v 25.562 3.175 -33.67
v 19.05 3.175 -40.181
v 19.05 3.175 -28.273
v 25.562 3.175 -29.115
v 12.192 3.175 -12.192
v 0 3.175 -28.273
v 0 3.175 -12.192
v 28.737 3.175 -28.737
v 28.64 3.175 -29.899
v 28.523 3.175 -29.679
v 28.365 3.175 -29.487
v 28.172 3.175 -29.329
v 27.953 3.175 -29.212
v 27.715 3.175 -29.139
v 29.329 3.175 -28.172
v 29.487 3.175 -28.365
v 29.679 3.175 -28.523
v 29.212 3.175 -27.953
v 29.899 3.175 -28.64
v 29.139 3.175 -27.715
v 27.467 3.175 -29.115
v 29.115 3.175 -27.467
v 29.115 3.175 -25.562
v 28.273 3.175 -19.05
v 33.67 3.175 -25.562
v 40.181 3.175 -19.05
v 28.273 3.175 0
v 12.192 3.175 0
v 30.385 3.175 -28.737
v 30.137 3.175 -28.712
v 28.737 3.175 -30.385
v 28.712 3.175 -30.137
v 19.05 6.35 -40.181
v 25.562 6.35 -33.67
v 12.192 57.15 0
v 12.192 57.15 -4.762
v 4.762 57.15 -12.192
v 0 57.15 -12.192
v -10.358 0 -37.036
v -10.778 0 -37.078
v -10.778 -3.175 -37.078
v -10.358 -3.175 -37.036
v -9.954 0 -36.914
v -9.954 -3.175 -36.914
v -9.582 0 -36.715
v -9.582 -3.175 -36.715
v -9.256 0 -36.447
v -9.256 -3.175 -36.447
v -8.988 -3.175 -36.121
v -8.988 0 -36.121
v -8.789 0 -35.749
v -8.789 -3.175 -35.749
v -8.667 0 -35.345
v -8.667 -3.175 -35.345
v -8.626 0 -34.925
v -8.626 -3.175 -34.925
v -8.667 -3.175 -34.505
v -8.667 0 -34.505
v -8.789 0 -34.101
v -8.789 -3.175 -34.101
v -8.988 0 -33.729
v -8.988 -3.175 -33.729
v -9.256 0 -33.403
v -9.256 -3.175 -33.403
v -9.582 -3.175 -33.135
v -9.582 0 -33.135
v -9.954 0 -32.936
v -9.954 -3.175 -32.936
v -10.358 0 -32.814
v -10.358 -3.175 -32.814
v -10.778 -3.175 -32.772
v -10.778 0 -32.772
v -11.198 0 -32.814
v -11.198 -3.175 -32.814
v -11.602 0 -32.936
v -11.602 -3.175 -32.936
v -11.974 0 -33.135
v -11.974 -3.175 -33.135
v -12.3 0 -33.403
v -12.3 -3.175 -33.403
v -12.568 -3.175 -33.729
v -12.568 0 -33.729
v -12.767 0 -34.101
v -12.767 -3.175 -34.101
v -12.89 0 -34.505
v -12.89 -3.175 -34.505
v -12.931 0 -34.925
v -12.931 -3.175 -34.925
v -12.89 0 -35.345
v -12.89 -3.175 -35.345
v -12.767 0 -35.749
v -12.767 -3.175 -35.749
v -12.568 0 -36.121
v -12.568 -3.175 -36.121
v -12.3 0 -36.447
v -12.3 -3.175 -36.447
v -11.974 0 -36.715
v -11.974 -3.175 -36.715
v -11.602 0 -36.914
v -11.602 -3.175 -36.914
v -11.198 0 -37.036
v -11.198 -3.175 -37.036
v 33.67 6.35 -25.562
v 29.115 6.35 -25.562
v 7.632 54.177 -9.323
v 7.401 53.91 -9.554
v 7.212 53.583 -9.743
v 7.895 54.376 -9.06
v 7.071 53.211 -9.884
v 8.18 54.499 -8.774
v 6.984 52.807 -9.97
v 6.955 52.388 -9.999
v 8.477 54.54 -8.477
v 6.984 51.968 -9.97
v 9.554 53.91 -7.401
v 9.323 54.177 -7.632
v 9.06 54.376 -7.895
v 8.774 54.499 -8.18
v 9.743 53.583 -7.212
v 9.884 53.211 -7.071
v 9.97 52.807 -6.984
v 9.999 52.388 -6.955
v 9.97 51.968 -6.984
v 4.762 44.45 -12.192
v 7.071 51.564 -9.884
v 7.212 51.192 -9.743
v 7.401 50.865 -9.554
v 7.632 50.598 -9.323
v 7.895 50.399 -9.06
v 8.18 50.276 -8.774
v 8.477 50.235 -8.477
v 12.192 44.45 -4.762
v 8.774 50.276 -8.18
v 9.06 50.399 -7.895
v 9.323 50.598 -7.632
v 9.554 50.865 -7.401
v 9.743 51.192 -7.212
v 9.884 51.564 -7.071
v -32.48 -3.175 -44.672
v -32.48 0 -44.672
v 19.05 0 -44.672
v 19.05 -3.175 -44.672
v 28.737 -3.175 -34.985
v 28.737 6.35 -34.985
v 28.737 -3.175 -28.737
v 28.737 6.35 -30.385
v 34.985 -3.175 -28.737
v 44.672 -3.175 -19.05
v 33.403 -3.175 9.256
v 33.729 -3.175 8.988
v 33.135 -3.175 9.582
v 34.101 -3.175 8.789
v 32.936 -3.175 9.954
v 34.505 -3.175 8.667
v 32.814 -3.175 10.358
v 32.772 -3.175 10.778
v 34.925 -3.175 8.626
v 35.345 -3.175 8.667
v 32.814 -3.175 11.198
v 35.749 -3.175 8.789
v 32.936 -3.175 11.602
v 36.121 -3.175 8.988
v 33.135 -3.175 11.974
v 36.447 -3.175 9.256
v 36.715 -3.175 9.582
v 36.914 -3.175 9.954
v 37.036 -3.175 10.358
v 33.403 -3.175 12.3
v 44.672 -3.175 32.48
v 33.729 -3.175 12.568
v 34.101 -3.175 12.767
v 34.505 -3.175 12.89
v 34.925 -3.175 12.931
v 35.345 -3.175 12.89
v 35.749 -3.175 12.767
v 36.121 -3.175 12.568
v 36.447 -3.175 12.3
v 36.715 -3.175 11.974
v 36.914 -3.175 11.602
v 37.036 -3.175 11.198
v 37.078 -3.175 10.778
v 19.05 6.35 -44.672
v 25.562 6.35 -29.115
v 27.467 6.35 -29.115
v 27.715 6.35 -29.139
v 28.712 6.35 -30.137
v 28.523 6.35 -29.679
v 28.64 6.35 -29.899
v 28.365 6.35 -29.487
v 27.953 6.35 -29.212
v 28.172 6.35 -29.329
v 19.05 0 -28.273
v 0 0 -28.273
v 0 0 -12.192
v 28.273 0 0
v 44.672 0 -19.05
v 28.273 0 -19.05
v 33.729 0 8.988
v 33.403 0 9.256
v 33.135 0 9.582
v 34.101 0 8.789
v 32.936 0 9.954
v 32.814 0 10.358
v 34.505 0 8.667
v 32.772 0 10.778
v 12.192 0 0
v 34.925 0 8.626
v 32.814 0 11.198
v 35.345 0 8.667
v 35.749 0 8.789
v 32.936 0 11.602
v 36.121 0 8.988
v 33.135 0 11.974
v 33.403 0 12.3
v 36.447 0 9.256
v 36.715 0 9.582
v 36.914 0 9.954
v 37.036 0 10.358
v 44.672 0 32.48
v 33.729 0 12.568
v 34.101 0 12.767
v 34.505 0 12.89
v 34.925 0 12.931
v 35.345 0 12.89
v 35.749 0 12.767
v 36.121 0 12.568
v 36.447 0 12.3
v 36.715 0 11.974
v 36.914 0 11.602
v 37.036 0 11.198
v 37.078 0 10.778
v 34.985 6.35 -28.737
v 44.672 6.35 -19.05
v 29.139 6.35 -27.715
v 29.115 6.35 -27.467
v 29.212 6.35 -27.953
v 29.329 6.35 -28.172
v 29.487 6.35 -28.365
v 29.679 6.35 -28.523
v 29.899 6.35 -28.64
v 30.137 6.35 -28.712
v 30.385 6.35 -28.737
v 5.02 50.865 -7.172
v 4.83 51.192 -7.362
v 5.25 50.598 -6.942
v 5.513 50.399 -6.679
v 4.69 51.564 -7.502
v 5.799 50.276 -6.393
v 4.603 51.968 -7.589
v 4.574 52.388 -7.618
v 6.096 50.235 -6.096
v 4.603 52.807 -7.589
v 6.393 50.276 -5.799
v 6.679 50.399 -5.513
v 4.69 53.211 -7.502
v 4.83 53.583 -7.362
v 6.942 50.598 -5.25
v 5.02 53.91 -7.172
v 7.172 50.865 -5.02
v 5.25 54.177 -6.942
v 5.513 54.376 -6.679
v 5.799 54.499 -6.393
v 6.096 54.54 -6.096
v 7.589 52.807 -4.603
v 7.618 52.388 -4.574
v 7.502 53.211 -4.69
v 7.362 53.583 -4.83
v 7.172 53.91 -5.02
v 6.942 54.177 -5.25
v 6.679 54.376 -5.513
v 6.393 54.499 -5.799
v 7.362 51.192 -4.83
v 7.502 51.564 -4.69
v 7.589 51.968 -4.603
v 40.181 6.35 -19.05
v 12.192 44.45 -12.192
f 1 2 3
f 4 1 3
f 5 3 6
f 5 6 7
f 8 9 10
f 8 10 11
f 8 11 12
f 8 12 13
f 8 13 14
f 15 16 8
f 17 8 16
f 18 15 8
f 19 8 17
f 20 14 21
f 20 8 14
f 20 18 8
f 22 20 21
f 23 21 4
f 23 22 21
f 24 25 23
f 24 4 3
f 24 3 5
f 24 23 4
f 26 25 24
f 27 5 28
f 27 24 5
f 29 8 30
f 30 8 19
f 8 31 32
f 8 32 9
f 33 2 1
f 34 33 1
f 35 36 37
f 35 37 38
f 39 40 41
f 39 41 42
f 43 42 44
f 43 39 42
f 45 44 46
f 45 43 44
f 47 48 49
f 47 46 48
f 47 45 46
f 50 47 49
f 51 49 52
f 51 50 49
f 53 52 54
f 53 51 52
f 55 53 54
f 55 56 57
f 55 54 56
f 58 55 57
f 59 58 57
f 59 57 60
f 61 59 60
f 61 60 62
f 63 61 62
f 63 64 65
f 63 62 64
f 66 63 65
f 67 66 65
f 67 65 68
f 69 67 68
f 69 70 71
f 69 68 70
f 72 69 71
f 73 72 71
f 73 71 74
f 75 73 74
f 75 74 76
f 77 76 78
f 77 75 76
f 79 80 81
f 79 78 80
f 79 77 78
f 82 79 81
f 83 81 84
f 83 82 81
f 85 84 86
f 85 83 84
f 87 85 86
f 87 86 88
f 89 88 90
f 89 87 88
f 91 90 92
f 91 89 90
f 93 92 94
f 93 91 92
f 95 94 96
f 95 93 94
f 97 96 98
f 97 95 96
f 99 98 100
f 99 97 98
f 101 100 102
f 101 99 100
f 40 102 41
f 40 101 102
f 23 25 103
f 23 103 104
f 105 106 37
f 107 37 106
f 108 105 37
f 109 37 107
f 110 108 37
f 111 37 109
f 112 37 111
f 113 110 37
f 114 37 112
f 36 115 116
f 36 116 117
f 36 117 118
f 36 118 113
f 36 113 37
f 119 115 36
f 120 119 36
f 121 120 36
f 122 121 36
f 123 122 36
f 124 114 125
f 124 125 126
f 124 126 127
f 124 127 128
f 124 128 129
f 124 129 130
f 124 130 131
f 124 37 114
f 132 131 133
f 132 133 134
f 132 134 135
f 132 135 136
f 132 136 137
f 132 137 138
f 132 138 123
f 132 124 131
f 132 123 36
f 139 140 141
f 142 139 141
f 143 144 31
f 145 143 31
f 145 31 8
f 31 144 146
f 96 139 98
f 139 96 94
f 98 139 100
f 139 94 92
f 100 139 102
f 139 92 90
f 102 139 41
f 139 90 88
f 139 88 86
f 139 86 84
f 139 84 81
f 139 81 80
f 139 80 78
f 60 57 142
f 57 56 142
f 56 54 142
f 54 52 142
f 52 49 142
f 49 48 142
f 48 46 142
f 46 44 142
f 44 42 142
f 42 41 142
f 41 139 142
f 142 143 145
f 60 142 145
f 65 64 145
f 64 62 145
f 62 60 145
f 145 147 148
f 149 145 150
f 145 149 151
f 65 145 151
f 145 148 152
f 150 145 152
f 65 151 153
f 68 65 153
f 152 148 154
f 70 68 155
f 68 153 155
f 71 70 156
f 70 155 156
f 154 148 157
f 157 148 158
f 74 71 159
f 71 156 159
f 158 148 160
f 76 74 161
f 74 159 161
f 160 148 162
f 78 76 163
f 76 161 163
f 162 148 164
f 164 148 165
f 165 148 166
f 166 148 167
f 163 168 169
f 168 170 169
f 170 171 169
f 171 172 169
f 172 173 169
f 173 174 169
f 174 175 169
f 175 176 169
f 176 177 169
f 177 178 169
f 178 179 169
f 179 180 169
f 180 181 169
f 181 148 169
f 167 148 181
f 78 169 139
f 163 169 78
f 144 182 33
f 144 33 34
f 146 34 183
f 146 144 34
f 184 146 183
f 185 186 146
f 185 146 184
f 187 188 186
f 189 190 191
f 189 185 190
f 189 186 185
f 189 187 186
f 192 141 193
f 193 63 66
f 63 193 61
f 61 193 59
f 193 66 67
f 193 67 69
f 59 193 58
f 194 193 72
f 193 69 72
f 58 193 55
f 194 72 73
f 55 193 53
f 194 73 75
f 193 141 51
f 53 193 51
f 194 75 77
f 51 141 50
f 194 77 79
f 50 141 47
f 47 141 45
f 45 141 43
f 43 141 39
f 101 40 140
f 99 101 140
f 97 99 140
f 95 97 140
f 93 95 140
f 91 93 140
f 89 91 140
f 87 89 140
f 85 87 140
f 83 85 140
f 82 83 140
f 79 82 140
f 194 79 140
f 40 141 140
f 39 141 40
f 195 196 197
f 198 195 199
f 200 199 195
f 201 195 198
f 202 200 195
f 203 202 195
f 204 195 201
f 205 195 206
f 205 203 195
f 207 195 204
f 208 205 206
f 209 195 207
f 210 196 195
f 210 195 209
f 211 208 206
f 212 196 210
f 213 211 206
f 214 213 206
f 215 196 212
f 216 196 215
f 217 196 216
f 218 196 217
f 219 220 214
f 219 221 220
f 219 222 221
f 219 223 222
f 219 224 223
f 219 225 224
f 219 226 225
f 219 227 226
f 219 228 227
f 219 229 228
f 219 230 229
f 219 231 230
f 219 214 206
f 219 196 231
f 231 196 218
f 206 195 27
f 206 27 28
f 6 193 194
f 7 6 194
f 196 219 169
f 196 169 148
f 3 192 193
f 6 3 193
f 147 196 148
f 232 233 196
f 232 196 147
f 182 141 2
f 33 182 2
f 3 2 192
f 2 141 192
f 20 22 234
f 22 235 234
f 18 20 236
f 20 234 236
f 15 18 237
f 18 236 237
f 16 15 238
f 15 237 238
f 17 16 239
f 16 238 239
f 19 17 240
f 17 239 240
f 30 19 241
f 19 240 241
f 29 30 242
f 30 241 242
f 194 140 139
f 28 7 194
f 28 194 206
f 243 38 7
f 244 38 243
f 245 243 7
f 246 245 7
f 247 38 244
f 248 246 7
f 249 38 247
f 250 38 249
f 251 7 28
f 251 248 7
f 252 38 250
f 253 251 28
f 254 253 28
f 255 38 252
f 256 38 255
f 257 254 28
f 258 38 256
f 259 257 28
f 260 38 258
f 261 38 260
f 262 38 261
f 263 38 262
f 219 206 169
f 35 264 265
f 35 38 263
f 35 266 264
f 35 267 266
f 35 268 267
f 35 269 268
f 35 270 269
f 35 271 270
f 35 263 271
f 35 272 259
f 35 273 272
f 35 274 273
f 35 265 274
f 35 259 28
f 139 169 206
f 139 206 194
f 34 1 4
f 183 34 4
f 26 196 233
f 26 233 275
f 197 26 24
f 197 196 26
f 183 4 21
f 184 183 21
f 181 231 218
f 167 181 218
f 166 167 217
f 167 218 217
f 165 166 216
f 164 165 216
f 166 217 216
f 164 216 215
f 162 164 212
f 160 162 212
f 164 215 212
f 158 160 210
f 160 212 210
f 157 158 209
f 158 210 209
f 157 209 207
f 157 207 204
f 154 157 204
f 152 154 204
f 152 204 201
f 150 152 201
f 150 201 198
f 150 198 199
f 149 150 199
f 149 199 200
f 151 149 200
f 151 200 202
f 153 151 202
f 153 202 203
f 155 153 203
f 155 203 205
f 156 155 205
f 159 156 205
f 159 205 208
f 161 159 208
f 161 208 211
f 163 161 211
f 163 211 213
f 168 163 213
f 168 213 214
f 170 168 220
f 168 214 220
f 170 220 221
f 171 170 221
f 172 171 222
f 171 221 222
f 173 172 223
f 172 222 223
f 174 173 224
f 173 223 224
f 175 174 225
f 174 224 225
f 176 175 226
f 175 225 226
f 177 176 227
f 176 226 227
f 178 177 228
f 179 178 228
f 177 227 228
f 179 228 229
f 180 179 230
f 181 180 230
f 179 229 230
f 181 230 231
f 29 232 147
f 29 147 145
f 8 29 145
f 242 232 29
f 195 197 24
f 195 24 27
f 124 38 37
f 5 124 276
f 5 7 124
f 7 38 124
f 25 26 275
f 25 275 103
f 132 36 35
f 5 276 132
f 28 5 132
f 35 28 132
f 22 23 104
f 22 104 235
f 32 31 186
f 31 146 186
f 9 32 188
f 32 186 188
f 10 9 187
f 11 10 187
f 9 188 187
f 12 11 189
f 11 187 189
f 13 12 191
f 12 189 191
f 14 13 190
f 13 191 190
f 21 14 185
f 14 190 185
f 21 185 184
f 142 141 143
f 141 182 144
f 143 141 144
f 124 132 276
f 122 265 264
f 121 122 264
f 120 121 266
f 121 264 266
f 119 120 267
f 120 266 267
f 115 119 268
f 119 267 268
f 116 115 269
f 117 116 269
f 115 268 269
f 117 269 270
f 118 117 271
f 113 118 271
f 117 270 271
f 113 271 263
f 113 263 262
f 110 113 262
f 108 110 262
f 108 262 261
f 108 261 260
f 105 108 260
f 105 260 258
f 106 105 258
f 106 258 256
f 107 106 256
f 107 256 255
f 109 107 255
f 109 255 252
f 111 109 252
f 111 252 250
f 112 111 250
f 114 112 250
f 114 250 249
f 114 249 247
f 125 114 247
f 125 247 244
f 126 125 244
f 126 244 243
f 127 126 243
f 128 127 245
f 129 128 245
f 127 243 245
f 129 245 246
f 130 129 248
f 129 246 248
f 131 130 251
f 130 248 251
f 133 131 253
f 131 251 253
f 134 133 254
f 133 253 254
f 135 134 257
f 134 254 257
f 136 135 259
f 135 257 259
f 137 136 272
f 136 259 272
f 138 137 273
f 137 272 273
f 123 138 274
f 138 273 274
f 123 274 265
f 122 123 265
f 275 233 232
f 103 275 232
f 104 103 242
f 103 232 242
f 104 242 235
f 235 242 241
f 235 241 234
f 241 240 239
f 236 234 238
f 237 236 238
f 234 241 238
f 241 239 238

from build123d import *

# Parameters (mm, degrees)
BOSS_EXTRUDE1_DEPTH          = 3.175
BOSS_EXTRUDE2_DEPTH          = 3.175
FILLET1_R                    = 1.27
BOSS_EXTRUDE3_DEPTH          = 41.275
FILLET1_OF_MIRROR2_R         = 1.27
BOSS_EXTRUDE4_DEPTH          = 12.7
F_18_0_1695_DIAMETER_HOLE1_D = 4.3053
CUT_EXTRUDE1_DEPTH           = 9.525
BOSS_EXTRUDE5_DEPTH          = 3.175
F_18_0_1695_DIAMETER_HOLE2_D = 4.3053


with BuildPart() as part:
    # Sketch1 → Boss-Extrude1 (new body)
    with BuildSketch(Plane(origin=(0, 0, 0), x_dir=(1, 0, 0), z_dir=(0, 1, 0))):
        Polygon((34.984785044, 28.736819587), (28.736819587, 28.736819587), (0, 0), (28.272599075, 0), (28.272599075, 19.05), (44.671604631, 19.05), align=None)
    boss_extrude1 = extrude(amount=BOSS_EXTRUDE1_DEPTH)

    # Mirror1: Boss-Extrude1 across plane
    add(boss_extrude1.mirror(Plane(origin=(0, 3.175, 0), x_dir=(-0.7071067811865507, 0, 0.7071067811865444), z_dir=(-0.7071067811865446, 0, -0.7071067811865506))))

    # Sketch2 → Boss-Extrude2 (add)
    with BuildSketch(Plane(origin=(0, 3.175, 0), x_dir=(1, 0, 0), z_dir=(0, 1, 0))):
        Polygon((29.11502011, 25.561819587), (29.11502011, 28.736819587), (34.984785044, 28.736819587), (44.671604631, 19.05), (40.181476571, 19.05), (33.669656983, 25.561819587), align=None)
    boss_extrude2 = extrude(amount=BOSS_EXTRUDE2_DEPTH)

    # Fillet1
    fillet1_edges = [part.edges().sort_by_distance(p)[0] for p in [
        (29.11502011, 4.7625, -28.736819587),
    ]]
    fillet(fillet1_edges, radius=FILLET1_R)

    # Sketch2<3> → Boss-Extrude3 (add)
    with BuildSketch(Plane(origin=(0, 3.175, 0), x_dir=(1, 0, 0), z_dir=(0, 1, 0))):
        Polygon((12.192, 0), (12.192, 12.192), (6.096, 6.096), align=None)
    boss_extrude3 = extrude(amount=BOSS_EXTRUDE3_DEPTH)

    # Mirror2: Boss-Extrude2, Boss-Extrude3 across plane
    add(boss_extrude2.mirror(Plane(origin=(0, 0, 0), x_dir=(-0.7071067811865506, 0, 0.7071067811865445), z_dir=(0.7071067811865445, 0, 0.7071067811865506))))
    add(boss_extrude3.mirror(Plane(origin=(0, 0, 0), x_dir=(-0.7071067811865506, 0, 0.7071067811865445), z_dir=(0.7071067811865445, 0, 0.7071067811865506))))

    # Fillet1 of Mirror2
    fillet1_of_mirror2_edges = [part.edges().sort_by_distance(p)[0] for p in [
        (28.736819587, 4.7625, -29.11502011),
    ]]
    fillet(fillet1_of_mirror2_edges, radius=FILLET1_OF_MIRROR2_R)

    # Sketch4 → Boss-Extrude4 (add)
    with BuildSketch(Plane(origin=(0, 44.45, 0), x_dir=(1, 0, 0), z_dir=(0, 1, 0))):
        Polygon((12.192, 0), (0, 12.192), (4.7625, 12.192), (12.192, 4.7625), align=None)
    extrude(amount=BOSS_EXTRUDE4_DEPTH)

    # #18 (0.1695) Diameter Hole1 (through all)
    with Locations(Plane(origin=(8.47725, 0, -8.47725), x_dir=(-0.7071067811865449, 0, -0.7071067811865502), z_dir=(0.7071067811865502, 0, -0.7071067811865449))):
        with Locations((0, 52.3875)):
            Hole(F_18_0_1695_DIAMETER_HOLE1_D / 2)

    # Sketch7 → Cut-Extrude1 (cut)
    with BuildSketch(Plane(origin=(0, 3.175, 0), x_dir=(1, 0, 0), z_dir=(0, 1, 0))):
        Polygon((0, 0), (12.192, 0), (0, 12.192), align=None)
    extrude(amount=-CUT_EXTRUDE1_DEPTH, mode=Mode.SUBTRACT)

    # Sketch8 → Boss-Extrude5 (add)
    with BuildSketch(Plane(origin=(0, 0, 0), x_dir=(-1, 0, 0), z_dir=(0, -1, 0))):
        Polygon((-6.096, 6.096), (32.479604631, 44.671604631), (-19.05, 44.671604631), (-28.736819587, 34.984785044), (-28.736819587, 28.736819587), align=None)
    boss_extrude5 = extrude(amount=BOSS_EXTRUDE5_DEPTH)

    # Mirror3: Boss-Extrude5 across plane
    add(boss_extrude5.mirror(Plane(origin=(0, 0, 0), x_dir=(-0.7071067811865506, 0, 0.7071067811865445), z_dir=(0.7071067811865445, 0, 0.7071067811865506))))

    # #18 (0.1695) Diameter Hole2 (through all)
    with Locations(Plane(origin=(0, -3.175, 0), x_dir=(-1, 0, 0), z_dir=(0, -1, 0))):
        with Locations((-34.924989631, -10.778219281)):
            f_18_0_1695_diameter_hole2 = Hole(F_18_0_1695_DIAMETER_HOLE2_D / 2)

    # Mirror4: #18 (0.1695) Diameter Hole2 across plane
    add(f_18_0_1695_diameter_hole2.mirror(Plane(origin=(0, 0, 0), x_dir=(-0.7071067811865506, 0, 0.7071067811865445), z_dir=(0.7071067811865445, 0, 0.7071067811865506))), mode=Mode.SUBTRACT)


solid = part.part
